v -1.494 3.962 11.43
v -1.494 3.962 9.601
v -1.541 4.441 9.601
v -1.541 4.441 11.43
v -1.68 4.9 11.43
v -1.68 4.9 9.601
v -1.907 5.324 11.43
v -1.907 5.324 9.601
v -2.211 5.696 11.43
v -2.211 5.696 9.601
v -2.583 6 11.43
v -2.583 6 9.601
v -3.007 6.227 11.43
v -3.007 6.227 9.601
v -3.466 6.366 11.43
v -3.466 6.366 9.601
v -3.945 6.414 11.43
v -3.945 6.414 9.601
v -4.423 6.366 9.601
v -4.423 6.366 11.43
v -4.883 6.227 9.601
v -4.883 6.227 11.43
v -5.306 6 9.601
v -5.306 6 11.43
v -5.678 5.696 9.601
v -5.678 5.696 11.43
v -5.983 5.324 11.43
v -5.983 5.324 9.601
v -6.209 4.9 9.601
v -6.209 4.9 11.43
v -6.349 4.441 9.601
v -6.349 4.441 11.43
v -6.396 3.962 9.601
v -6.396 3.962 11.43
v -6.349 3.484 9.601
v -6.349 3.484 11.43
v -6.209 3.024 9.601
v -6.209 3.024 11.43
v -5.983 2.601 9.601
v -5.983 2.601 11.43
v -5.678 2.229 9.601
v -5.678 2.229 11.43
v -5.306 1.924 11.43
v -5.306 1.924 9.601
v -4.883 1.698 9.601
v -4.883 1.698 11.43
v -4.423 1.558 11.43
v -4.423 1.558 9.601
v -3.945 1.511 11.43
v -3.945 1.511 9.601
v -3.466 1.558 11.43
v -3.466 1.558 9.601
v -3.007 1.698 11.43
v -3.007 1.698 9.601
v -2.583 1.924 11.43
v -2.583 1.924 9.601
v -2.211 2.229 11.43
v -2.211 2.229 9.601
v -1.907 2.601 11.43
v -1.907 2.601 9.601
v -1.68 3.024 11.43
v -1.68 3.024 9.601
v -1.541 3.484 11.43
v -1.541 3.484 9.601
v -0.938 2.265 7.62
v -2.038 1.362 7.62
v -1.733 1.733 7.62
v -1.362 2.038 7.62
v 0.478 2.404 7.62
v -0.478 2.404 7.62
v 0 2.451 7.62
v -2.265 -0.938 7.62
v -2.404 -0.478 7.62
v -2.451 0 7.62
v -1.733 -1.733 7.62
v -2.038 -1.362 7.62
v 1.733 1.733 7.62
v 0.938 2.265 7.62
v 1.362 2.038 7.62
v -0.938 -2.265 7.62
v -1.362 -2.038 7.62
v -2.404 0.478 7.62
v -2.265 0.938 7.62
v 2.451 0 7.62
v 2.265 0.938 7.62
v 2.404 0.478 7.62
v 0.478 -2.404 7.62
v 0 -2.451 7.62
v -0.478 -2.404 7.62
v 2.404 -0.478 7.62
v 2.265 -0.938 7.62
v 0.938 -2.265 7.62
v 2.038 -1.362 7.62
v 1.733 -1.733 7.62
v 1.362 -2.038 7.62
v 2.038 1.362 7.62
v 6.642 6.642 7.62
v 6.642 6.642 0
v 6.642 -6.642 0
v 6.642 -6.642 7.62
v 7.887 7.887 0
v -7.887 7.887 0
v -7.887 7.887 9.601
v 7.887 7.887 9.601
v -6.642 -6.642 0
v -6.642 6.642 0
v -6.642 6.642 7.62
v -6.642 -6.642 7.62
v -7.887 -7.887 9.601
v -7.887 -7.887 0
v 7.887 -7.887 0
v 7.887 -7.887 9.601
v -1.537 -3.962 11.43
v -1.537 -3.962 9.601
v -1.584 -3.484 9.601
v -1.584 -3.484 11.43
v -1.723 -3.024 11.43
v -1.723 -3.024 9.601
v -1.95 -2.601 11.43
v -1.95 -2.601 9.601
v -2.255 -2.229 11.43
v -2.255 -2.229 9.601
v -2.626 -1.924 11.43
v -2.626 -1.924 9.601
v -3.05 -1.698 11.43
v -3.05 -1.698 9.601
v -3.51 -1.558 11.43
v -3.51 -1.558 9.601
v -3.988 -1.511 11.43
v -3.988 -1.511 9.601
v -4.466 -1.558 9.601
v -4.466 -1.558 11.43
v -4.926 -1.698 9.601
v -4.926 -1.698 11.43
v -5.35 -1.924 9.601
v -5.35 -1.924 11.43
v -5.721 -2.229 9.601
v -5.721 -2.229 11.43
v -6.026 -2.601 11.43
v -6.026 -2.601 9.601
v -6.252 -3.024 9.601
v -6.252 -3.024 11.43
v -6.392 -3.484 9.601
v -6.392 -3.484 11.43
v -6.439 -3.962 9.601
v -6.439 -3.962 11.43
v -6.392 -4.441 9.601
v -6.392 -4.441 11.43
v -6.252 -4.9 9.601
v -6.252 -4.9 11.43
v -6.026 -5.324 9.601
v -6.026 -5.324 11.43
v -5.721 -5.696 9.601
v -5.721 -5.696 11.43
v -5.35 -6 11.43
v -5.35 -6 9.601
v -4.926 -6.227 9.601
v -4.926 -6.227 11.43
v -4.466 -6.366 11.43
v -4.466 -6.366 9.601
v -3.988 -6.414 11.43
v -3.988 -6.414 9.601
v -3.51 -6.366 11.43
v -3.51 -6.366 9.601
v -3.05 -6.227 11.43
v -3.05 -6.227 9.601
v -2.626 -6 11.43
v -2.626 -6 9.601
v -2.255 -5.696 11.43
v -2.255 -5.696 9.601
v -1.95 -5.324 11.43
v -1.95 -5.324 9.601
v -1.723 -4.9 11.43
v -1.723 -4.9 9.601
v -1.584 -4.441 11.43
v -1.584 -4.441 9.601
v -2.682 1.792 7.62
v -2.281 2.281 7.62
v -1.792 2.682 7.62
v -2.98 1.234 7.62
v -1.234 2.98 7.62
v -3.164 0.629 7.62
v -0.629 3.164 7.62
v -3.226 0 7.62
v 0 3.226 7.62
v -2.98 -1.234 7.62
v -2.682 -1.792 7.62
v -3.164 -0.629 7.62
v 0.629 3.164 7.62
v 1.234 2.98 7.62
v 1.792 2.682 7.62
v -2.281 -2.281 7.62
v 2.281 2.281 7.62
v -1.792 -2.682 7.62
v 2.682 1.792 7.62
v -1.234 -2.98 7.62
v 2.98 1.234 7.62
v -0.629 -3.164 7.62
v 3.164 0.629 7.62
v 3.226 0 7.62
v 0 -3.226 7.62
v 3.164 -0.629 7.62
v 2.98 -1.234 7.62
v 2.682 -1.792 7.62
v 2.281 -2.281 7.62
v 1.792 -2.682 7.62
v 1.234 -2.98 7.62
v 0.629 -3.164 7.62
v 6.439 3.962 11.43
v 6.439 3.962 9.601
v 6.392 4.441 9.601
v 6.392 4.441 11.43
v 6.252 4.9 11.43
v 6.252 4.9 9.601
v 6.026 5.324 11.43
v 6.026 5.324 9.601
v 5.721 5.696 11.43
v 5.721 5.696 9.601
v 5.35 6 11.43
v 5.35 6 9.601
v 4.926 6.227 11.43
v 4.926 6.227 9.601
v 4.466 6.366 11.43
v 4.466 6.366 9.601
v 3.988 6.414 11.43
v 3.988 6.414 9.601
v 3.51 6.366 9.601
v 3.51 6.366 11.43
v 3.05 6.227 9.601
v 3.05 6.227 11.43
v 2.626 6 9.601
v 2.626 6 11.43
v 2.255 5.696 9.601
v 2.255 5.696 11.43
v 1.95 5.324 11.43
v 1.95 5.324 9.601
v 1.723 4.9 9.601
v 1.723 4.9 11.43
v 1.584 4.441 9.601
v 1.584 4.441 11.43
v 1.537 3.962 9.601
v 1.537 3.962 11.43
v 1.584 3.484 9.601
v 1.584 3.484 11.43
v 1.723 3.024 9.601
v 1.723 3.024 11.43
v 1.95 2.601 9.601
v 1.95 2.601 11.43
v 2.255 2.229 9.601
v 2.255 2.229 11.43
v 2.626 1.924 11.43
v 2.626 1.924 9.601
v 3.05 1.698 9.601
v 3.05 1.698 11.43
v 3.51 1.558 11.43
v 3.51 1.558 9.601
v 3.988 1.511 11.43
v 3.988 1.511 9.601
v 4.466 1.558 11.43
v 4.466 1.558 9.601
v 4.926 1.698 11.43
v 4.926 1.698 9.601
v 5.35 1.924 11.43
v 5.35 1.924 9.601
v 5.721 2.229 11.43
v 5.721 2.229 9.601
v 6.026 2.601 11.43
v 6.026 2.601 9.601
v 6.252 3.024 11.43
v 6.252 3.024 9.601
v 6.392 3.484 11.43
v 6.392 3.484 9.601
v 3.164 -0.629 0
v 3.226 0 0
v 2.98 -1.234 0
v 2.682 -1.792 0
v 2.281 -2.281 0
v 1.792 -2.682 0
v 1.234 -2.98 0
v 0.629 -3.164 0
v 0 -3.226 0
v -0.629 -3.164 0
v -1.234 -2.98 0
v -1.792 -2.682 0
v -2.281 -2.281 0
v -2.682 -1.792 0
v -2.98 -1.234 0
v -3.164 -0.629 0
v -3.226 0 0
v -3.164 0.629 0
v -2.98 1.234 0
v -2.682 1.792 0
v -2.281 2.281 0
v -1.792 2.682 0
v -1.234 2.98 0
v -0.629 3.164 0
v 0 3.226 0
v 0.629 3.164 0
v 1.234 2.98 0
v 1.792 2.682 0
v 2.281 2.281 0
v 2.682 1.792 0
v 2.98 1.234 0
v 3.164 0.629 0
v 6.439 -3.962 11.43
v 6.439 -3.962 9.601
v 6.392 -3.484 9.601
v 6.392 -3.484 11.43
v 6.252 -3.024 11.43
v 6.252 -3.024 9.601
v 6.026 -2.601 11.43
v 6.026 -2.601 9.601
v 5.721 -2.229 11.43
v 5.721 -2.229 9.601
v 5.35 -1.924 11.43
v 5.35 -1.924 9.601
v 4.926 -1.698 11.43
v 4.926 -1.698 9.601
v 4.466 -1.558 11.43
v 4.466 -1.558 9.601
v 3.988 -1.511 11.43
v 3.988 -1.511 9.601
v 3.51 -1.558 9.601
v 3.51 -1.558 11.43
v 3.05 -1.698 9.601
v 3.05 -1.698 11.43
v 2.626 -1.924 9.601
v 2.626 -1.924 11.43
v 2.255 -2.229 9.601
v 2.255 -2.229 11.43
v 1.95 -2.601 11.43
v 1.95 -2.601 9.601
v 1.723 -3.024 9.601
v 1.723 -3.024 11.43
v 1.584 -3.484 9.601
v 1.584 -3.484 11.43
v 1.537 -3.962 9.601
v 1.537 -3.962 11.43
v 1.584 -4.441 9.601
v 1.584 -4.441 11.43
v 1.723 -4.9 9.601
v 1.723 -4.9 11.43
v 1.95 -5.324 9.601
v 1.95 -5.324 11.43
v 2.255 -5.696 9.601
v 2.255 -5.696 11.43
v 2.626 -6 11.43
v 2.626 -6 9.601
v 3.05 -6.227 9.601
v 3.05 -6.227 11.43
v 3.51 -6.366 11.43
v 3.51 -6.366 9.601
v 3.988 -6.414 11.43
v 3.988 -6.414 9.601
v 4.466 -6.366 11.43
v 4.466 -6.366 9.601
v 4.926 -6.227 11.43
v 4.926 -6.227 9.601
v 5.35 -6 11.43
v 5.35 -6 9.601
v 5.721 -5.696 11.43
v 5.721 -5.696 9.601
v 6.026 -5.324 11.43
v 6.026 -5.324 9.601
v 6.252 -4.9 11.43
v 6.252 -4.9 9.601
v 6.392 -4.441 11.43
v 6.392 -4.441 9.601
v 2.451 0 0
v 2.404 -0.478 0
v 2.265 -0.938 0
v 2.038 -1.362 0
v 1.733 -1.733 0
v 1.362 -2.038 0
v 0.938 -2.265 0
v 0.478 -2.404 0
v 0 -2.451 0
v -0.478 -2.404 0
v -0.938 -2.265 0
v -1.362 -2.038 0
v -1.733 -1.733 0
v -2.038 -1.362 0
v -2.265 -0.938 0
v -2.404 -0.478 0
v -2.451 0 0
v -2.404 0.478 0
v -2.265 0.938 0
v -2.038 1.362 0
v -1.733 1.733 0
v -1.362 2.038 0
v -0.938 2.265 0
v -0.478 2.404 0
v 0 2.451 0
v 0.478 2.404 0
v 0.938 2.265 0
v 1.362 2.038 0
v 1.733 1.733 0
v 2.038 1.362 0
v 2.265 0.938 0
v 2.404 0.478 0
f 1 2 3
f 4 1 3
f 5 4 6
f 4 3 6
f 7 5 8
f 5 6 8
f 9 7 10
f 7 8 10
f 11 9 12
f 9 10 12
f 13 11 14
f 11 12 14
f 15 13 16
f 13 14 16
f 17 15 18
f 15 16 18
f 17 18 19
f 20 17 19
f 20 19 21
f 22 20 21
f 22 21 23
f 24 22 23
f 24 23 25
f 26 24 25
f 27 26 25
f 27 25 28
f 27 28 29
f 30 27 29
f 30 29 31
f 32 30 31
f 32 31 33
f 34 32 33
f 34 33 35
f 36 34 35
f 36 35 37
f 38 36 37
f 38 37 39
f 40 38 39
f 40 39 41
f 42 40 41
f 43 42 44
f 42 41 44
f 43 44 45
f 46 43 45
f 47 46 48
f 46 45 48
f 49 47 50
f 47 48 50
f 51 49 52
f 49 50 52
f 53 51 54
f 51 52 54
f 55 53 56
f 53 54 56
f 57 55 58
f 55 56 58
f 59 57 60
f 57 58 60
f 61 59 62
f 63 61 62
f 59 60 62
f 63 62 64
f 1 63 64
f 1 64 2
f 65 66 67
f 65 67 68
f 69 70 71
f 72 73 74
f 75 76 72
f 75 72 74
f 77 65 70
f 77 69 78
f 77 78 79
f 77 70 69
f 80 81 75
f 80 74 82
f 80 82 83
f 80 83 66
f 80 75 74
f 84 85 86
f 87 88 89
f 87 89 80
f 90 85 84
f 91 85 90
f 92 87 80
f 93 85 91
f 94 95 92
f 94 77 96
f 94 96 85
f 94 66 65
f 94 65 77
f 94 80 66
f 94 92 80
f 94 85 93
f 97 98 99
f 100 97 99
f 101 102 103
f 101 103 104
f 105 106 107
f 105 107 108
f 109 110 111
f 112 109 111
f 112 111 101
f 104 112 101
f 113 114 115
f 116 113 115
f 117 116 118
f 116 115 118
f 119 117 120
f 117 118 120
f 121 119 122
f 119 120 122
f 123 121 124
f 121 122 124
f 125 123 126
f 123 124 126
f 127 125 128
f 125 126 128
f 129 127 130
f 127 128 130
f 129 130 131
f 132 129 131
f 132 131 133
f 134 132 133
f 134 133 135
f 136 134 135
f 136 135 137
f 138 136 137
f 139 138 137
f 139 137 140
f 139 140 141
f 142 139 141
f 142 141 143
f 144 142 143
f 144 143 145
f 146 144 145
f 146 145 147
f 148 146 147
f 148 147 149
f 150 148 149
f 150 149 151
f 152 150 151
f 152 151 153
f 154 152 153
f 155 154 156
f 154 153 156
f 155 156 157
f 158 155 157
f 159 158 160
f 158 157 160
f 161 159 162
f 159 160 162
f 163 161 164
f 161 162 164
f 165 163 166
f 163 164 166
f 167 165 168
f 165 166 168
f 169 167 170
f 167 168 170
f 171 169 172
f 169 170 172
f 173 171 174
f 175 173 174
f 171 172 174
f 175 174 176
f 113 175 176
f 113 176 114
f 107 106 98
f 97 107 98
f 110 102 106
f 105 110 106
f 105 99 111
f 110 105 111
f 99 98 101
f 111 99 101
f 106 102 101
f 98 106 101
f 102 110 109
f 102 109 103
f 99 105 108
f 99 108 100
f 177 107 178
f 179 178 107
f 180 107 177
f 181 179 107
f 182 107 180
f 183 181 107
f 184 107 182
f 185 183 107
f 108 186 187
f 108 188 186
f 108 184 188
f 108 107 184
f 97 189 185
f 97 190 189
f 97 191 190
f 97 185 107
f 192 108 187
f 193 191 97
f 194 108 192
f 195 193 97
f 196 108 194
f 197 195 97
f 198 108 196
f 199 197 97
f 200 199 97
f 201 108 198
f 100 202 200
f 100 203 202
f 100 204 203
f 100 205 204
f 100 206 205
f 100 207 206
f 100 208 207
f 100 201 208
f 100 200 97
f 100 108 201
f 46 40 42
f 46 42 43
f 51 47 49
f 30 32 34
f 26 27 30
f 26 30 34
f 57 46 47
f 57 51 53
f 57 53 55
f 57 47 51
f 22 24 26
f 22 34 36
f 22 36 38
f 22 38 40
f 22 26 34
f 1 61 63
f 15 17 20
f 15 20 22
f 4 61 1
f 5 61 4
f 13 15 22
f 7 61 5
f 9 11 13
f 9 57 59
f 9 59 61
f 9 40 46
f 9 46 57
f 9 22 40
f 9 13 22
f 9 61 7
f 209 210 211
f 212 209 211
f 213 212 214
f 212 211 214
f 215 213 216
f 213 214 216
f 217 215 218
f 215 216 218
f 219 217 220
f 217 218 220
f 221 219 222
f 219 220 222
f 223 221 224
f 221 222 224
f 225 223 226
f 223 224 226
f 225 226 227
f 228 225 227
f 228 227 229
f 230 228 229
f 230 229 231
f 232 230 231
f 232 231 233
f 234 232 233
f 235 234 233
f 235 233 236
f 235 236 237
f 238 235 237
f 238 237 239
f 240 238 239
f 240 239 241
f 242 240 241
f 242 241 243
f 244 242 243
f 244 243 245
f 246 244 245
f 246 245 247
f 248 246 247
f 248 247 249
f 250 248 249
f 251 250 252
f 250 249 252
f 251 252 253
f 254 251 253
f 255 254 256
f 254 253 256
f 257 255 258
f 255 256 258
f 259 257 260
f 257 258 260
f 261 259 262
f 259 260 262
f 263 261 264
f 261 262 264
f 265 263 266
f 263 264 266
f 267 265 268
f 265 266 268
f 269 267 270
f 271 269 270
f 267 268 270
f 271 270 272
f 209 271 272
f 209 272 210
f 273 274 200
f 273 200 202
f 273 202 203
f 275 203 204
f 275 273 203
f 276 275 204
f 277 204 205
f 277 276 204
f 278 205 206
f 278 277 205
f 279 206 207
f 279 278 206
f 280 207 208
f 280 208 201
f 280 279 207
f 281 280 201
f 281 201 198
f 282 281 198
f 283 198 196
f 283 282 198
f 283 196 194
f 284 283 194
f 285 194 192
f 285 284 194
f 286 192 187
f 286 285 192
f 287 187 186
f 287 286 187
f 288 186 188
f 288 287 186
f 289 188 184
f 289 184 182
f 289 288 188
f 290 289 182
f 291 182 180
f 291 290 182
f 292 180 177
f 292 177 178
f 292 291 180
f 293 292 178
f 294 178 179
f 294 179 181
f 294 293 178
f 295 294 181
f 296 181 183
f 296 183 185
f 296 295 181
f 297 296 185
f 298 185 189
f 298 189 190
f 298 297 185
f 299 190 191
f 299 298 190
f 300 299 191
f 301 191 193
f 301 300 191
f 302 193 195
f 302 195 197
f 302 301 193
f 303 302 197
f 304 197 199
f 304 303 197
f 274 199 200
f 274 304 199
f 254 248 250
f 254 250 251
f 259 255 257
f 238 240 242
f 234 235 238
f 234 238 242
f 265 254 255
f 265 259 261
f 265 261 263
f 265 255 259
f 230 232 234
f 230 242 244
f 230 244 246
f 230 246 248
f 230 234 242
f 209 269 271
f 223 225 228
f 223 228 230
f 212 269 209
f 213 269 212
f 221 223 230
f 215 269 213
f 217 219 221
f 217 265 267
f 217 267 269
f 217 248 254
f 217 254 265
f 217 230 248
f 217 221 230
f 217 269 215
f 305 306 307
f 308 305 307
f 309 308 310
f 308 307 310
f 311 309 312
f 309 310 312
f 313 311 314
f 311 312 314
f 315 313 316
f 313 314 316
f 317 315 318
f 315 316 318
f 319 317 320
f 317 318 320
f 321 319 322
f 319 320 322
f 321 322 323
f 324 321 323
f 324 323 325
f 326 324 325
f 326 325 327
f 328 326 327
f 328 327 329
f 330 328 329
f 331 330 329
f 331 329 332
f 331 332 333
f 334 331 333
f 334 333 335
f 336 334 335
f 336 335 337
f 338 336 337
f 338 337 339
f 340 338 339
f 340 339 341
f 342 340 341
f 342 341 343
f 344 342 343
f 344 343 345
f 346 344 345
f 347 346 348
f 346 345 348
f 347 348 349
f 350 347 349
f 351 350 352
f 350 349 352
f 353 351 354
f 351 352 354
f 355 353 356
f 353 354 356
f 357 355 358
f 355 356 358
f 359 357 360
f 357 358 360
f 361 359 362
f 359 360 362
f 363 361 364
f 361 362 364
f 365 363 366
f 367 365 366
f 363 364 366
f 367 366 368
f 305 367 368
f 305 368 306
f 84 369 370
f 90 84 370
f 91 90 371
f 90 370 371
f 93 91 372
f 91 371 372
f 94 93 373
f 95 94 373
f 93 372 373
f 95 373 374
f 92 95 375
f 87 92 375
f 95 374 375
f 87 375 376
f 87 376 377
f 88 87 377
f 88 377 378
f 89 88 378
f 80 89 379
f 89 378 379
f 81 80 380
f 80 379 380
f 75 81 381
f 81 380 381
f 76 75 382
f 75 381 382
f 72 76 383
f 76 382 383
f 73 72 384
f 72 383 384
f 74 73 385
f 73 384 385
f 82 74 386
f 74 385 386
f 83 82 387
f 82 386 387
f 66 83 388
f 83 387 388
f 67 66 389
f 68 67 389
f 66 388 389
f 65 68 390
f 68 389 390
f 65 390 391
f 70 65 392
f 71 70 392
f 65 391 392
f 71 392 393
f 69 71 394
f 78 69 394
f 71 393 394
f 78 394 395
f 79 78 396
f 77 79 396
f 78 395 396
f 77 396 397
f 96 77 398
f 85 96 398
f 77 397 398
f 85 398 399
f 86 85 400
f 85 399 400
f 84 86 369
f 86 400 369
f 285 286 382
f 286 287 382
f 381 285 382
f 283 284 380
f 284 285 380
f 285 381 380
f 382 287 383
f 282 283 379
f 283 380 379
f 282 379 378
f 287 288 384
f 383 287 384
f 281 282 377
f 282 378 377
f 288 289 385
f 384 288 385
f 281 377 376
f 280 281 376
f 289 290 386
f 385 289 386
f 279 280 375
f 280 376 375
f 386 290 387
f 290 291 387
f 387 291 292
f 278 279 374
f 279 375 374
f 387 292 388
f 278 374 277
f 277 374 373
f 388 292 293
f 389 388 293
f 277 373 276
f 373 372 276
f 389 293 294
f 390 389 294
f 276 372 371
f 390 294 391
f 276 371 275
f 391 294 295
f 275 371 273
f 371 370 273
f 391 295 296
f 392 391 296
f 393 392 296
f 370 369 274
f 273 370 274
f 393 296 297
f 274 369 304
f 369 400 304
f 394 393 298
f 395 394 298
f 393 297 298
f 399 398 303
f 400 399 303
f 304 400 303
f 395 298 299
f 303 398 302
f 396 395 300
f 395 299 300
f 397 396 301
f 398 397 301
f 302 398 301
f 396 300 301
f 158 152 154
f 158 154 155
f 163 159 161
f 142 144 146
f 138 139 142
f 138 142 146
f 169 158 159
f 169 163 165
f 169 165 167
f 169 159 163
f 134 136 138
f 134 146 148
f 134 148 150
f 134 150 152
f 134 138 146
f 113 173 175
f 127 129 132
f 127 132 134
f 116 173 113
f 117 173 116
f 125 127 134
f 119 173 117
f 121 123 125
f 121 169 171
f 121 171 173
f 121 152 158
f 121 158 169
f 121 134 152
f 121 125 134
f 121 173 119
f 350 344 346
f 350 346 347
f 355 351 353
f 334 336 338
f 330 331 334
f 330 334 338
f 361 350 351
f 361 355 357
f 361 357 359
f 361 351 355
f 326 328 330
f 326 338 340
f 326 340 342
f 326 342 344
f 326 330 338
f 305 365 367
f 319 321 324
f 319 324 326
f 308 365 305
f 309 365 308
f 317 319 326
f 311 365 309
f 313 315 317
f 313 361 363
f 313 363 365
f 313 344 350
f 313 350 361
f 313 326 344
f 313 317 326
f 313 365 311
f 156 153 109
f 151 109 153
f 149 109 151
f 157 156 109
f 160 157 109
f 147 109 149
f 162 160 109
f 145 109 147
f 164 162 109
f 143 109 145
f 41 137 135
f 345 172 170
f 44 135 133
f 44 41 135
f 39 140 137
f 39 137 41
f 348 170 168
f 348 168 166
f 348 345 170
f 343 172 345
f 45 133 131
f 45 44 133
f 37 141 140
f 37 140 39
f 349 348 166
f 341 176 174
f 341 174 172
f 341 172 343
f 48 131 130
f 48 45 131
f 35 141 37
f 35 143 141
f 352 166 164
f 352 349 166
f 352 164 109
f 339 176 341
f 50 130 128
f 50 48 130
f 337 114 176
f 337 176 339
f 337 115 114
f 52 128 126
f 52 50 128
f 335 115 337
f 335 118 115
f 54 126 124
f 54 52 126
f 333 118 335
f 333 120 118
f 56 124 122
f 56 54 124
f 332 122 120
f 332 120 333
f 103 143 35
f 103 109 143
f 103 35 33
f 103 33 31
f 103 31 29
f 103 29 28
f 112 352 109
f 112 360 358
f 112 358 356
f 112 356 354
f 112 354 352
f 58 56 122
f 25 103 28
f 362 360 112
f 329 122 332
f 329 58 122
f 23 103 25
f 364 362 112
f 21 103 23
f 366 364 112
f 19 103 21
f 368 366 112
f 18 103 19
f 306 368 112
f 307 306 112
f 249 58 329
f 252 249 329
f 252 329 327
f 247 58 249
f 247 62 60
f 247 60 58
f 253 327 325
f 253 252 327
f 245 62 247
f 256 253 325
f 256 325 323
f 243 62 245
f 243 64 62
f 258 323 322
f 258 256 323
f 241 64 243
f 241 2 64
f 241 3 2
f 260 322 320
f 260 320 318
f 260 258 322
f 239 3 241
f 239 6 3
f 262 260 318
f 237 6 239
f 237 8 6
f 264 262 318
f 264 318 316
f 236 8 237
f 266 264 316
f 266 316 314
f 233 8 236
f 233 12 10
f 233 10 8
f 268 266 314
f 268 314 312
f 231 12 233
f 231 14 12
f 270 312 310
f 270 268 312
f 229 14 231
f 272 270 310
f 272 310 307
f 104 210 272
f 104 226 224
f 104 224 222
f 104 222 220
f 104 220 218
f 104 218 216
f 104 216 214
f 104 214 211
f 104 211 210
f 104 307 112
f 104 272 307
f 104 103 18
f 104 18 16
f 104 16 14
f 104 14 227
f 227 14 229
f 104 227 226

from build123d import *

# Parameters (mm, degrees)
F0_W     = 15.7734
F0_H     = 15.7734
F1_DEPTH = 9.6012
F2_R     = 2.4511
F3_DEPTH = 11.43
F4_W     = 13.2842
F4_H     = 13.2842
F4_R     = 3.2258
F5_DEPTH = 7.62
F6_R     = 2.4511
F7_DEPTH = 7.62


# Not quite as in the source:
# - a feature names something its author has since deleted; it is built from what else it names


with BuildPart() as f1:
    # F0 (on Top) → F1 (new body)
    with BuildSketch(Plane.XY):
        Rectangle(F0_W, F0_H)
    extrude(amount=F1_DEPTH)

    # F2 (on face) → F3 (join)
    with BuildSketch(Plane.XY):
        with Locations((-3.94462, 3.9624)):
            Circle(F2_R)
        with Locations((3.9878, 3.9624)):
            Circle(F2_R)
        with Locations((-3.9878, -3.9624)):
            Circle(F2_R)
        with Locations((3.9878, -3.9624)):
            Circle(F2_R)
    extrude(amount=F3_DEPTH)

    # F4 (on face) → F5 (cut)
    with BuildSketch(Plane(origin=(0, 0, 0), x_dir=(1, 0, 0), z_dir=(0, 0, -1))):
        Rectangle(F4_W, F4_H)
        Circle(F4_R, mode=Mode.SUBTRACT)
    extrude(amount=-F5_DEPTH, mode=Mode.SUBTRACT)

    # F6 (on face) → F7 (cut)
    with BuildSketch(Plane(origin=(0, 0, 0), x_dir=(1, 0, 0), z_dir=(0, 0, -1))):
        Circle(F6_R)
    extrude(amount=-F7_DEPTH, mode=Mode.SUBTRACT)


solid = f1.part
